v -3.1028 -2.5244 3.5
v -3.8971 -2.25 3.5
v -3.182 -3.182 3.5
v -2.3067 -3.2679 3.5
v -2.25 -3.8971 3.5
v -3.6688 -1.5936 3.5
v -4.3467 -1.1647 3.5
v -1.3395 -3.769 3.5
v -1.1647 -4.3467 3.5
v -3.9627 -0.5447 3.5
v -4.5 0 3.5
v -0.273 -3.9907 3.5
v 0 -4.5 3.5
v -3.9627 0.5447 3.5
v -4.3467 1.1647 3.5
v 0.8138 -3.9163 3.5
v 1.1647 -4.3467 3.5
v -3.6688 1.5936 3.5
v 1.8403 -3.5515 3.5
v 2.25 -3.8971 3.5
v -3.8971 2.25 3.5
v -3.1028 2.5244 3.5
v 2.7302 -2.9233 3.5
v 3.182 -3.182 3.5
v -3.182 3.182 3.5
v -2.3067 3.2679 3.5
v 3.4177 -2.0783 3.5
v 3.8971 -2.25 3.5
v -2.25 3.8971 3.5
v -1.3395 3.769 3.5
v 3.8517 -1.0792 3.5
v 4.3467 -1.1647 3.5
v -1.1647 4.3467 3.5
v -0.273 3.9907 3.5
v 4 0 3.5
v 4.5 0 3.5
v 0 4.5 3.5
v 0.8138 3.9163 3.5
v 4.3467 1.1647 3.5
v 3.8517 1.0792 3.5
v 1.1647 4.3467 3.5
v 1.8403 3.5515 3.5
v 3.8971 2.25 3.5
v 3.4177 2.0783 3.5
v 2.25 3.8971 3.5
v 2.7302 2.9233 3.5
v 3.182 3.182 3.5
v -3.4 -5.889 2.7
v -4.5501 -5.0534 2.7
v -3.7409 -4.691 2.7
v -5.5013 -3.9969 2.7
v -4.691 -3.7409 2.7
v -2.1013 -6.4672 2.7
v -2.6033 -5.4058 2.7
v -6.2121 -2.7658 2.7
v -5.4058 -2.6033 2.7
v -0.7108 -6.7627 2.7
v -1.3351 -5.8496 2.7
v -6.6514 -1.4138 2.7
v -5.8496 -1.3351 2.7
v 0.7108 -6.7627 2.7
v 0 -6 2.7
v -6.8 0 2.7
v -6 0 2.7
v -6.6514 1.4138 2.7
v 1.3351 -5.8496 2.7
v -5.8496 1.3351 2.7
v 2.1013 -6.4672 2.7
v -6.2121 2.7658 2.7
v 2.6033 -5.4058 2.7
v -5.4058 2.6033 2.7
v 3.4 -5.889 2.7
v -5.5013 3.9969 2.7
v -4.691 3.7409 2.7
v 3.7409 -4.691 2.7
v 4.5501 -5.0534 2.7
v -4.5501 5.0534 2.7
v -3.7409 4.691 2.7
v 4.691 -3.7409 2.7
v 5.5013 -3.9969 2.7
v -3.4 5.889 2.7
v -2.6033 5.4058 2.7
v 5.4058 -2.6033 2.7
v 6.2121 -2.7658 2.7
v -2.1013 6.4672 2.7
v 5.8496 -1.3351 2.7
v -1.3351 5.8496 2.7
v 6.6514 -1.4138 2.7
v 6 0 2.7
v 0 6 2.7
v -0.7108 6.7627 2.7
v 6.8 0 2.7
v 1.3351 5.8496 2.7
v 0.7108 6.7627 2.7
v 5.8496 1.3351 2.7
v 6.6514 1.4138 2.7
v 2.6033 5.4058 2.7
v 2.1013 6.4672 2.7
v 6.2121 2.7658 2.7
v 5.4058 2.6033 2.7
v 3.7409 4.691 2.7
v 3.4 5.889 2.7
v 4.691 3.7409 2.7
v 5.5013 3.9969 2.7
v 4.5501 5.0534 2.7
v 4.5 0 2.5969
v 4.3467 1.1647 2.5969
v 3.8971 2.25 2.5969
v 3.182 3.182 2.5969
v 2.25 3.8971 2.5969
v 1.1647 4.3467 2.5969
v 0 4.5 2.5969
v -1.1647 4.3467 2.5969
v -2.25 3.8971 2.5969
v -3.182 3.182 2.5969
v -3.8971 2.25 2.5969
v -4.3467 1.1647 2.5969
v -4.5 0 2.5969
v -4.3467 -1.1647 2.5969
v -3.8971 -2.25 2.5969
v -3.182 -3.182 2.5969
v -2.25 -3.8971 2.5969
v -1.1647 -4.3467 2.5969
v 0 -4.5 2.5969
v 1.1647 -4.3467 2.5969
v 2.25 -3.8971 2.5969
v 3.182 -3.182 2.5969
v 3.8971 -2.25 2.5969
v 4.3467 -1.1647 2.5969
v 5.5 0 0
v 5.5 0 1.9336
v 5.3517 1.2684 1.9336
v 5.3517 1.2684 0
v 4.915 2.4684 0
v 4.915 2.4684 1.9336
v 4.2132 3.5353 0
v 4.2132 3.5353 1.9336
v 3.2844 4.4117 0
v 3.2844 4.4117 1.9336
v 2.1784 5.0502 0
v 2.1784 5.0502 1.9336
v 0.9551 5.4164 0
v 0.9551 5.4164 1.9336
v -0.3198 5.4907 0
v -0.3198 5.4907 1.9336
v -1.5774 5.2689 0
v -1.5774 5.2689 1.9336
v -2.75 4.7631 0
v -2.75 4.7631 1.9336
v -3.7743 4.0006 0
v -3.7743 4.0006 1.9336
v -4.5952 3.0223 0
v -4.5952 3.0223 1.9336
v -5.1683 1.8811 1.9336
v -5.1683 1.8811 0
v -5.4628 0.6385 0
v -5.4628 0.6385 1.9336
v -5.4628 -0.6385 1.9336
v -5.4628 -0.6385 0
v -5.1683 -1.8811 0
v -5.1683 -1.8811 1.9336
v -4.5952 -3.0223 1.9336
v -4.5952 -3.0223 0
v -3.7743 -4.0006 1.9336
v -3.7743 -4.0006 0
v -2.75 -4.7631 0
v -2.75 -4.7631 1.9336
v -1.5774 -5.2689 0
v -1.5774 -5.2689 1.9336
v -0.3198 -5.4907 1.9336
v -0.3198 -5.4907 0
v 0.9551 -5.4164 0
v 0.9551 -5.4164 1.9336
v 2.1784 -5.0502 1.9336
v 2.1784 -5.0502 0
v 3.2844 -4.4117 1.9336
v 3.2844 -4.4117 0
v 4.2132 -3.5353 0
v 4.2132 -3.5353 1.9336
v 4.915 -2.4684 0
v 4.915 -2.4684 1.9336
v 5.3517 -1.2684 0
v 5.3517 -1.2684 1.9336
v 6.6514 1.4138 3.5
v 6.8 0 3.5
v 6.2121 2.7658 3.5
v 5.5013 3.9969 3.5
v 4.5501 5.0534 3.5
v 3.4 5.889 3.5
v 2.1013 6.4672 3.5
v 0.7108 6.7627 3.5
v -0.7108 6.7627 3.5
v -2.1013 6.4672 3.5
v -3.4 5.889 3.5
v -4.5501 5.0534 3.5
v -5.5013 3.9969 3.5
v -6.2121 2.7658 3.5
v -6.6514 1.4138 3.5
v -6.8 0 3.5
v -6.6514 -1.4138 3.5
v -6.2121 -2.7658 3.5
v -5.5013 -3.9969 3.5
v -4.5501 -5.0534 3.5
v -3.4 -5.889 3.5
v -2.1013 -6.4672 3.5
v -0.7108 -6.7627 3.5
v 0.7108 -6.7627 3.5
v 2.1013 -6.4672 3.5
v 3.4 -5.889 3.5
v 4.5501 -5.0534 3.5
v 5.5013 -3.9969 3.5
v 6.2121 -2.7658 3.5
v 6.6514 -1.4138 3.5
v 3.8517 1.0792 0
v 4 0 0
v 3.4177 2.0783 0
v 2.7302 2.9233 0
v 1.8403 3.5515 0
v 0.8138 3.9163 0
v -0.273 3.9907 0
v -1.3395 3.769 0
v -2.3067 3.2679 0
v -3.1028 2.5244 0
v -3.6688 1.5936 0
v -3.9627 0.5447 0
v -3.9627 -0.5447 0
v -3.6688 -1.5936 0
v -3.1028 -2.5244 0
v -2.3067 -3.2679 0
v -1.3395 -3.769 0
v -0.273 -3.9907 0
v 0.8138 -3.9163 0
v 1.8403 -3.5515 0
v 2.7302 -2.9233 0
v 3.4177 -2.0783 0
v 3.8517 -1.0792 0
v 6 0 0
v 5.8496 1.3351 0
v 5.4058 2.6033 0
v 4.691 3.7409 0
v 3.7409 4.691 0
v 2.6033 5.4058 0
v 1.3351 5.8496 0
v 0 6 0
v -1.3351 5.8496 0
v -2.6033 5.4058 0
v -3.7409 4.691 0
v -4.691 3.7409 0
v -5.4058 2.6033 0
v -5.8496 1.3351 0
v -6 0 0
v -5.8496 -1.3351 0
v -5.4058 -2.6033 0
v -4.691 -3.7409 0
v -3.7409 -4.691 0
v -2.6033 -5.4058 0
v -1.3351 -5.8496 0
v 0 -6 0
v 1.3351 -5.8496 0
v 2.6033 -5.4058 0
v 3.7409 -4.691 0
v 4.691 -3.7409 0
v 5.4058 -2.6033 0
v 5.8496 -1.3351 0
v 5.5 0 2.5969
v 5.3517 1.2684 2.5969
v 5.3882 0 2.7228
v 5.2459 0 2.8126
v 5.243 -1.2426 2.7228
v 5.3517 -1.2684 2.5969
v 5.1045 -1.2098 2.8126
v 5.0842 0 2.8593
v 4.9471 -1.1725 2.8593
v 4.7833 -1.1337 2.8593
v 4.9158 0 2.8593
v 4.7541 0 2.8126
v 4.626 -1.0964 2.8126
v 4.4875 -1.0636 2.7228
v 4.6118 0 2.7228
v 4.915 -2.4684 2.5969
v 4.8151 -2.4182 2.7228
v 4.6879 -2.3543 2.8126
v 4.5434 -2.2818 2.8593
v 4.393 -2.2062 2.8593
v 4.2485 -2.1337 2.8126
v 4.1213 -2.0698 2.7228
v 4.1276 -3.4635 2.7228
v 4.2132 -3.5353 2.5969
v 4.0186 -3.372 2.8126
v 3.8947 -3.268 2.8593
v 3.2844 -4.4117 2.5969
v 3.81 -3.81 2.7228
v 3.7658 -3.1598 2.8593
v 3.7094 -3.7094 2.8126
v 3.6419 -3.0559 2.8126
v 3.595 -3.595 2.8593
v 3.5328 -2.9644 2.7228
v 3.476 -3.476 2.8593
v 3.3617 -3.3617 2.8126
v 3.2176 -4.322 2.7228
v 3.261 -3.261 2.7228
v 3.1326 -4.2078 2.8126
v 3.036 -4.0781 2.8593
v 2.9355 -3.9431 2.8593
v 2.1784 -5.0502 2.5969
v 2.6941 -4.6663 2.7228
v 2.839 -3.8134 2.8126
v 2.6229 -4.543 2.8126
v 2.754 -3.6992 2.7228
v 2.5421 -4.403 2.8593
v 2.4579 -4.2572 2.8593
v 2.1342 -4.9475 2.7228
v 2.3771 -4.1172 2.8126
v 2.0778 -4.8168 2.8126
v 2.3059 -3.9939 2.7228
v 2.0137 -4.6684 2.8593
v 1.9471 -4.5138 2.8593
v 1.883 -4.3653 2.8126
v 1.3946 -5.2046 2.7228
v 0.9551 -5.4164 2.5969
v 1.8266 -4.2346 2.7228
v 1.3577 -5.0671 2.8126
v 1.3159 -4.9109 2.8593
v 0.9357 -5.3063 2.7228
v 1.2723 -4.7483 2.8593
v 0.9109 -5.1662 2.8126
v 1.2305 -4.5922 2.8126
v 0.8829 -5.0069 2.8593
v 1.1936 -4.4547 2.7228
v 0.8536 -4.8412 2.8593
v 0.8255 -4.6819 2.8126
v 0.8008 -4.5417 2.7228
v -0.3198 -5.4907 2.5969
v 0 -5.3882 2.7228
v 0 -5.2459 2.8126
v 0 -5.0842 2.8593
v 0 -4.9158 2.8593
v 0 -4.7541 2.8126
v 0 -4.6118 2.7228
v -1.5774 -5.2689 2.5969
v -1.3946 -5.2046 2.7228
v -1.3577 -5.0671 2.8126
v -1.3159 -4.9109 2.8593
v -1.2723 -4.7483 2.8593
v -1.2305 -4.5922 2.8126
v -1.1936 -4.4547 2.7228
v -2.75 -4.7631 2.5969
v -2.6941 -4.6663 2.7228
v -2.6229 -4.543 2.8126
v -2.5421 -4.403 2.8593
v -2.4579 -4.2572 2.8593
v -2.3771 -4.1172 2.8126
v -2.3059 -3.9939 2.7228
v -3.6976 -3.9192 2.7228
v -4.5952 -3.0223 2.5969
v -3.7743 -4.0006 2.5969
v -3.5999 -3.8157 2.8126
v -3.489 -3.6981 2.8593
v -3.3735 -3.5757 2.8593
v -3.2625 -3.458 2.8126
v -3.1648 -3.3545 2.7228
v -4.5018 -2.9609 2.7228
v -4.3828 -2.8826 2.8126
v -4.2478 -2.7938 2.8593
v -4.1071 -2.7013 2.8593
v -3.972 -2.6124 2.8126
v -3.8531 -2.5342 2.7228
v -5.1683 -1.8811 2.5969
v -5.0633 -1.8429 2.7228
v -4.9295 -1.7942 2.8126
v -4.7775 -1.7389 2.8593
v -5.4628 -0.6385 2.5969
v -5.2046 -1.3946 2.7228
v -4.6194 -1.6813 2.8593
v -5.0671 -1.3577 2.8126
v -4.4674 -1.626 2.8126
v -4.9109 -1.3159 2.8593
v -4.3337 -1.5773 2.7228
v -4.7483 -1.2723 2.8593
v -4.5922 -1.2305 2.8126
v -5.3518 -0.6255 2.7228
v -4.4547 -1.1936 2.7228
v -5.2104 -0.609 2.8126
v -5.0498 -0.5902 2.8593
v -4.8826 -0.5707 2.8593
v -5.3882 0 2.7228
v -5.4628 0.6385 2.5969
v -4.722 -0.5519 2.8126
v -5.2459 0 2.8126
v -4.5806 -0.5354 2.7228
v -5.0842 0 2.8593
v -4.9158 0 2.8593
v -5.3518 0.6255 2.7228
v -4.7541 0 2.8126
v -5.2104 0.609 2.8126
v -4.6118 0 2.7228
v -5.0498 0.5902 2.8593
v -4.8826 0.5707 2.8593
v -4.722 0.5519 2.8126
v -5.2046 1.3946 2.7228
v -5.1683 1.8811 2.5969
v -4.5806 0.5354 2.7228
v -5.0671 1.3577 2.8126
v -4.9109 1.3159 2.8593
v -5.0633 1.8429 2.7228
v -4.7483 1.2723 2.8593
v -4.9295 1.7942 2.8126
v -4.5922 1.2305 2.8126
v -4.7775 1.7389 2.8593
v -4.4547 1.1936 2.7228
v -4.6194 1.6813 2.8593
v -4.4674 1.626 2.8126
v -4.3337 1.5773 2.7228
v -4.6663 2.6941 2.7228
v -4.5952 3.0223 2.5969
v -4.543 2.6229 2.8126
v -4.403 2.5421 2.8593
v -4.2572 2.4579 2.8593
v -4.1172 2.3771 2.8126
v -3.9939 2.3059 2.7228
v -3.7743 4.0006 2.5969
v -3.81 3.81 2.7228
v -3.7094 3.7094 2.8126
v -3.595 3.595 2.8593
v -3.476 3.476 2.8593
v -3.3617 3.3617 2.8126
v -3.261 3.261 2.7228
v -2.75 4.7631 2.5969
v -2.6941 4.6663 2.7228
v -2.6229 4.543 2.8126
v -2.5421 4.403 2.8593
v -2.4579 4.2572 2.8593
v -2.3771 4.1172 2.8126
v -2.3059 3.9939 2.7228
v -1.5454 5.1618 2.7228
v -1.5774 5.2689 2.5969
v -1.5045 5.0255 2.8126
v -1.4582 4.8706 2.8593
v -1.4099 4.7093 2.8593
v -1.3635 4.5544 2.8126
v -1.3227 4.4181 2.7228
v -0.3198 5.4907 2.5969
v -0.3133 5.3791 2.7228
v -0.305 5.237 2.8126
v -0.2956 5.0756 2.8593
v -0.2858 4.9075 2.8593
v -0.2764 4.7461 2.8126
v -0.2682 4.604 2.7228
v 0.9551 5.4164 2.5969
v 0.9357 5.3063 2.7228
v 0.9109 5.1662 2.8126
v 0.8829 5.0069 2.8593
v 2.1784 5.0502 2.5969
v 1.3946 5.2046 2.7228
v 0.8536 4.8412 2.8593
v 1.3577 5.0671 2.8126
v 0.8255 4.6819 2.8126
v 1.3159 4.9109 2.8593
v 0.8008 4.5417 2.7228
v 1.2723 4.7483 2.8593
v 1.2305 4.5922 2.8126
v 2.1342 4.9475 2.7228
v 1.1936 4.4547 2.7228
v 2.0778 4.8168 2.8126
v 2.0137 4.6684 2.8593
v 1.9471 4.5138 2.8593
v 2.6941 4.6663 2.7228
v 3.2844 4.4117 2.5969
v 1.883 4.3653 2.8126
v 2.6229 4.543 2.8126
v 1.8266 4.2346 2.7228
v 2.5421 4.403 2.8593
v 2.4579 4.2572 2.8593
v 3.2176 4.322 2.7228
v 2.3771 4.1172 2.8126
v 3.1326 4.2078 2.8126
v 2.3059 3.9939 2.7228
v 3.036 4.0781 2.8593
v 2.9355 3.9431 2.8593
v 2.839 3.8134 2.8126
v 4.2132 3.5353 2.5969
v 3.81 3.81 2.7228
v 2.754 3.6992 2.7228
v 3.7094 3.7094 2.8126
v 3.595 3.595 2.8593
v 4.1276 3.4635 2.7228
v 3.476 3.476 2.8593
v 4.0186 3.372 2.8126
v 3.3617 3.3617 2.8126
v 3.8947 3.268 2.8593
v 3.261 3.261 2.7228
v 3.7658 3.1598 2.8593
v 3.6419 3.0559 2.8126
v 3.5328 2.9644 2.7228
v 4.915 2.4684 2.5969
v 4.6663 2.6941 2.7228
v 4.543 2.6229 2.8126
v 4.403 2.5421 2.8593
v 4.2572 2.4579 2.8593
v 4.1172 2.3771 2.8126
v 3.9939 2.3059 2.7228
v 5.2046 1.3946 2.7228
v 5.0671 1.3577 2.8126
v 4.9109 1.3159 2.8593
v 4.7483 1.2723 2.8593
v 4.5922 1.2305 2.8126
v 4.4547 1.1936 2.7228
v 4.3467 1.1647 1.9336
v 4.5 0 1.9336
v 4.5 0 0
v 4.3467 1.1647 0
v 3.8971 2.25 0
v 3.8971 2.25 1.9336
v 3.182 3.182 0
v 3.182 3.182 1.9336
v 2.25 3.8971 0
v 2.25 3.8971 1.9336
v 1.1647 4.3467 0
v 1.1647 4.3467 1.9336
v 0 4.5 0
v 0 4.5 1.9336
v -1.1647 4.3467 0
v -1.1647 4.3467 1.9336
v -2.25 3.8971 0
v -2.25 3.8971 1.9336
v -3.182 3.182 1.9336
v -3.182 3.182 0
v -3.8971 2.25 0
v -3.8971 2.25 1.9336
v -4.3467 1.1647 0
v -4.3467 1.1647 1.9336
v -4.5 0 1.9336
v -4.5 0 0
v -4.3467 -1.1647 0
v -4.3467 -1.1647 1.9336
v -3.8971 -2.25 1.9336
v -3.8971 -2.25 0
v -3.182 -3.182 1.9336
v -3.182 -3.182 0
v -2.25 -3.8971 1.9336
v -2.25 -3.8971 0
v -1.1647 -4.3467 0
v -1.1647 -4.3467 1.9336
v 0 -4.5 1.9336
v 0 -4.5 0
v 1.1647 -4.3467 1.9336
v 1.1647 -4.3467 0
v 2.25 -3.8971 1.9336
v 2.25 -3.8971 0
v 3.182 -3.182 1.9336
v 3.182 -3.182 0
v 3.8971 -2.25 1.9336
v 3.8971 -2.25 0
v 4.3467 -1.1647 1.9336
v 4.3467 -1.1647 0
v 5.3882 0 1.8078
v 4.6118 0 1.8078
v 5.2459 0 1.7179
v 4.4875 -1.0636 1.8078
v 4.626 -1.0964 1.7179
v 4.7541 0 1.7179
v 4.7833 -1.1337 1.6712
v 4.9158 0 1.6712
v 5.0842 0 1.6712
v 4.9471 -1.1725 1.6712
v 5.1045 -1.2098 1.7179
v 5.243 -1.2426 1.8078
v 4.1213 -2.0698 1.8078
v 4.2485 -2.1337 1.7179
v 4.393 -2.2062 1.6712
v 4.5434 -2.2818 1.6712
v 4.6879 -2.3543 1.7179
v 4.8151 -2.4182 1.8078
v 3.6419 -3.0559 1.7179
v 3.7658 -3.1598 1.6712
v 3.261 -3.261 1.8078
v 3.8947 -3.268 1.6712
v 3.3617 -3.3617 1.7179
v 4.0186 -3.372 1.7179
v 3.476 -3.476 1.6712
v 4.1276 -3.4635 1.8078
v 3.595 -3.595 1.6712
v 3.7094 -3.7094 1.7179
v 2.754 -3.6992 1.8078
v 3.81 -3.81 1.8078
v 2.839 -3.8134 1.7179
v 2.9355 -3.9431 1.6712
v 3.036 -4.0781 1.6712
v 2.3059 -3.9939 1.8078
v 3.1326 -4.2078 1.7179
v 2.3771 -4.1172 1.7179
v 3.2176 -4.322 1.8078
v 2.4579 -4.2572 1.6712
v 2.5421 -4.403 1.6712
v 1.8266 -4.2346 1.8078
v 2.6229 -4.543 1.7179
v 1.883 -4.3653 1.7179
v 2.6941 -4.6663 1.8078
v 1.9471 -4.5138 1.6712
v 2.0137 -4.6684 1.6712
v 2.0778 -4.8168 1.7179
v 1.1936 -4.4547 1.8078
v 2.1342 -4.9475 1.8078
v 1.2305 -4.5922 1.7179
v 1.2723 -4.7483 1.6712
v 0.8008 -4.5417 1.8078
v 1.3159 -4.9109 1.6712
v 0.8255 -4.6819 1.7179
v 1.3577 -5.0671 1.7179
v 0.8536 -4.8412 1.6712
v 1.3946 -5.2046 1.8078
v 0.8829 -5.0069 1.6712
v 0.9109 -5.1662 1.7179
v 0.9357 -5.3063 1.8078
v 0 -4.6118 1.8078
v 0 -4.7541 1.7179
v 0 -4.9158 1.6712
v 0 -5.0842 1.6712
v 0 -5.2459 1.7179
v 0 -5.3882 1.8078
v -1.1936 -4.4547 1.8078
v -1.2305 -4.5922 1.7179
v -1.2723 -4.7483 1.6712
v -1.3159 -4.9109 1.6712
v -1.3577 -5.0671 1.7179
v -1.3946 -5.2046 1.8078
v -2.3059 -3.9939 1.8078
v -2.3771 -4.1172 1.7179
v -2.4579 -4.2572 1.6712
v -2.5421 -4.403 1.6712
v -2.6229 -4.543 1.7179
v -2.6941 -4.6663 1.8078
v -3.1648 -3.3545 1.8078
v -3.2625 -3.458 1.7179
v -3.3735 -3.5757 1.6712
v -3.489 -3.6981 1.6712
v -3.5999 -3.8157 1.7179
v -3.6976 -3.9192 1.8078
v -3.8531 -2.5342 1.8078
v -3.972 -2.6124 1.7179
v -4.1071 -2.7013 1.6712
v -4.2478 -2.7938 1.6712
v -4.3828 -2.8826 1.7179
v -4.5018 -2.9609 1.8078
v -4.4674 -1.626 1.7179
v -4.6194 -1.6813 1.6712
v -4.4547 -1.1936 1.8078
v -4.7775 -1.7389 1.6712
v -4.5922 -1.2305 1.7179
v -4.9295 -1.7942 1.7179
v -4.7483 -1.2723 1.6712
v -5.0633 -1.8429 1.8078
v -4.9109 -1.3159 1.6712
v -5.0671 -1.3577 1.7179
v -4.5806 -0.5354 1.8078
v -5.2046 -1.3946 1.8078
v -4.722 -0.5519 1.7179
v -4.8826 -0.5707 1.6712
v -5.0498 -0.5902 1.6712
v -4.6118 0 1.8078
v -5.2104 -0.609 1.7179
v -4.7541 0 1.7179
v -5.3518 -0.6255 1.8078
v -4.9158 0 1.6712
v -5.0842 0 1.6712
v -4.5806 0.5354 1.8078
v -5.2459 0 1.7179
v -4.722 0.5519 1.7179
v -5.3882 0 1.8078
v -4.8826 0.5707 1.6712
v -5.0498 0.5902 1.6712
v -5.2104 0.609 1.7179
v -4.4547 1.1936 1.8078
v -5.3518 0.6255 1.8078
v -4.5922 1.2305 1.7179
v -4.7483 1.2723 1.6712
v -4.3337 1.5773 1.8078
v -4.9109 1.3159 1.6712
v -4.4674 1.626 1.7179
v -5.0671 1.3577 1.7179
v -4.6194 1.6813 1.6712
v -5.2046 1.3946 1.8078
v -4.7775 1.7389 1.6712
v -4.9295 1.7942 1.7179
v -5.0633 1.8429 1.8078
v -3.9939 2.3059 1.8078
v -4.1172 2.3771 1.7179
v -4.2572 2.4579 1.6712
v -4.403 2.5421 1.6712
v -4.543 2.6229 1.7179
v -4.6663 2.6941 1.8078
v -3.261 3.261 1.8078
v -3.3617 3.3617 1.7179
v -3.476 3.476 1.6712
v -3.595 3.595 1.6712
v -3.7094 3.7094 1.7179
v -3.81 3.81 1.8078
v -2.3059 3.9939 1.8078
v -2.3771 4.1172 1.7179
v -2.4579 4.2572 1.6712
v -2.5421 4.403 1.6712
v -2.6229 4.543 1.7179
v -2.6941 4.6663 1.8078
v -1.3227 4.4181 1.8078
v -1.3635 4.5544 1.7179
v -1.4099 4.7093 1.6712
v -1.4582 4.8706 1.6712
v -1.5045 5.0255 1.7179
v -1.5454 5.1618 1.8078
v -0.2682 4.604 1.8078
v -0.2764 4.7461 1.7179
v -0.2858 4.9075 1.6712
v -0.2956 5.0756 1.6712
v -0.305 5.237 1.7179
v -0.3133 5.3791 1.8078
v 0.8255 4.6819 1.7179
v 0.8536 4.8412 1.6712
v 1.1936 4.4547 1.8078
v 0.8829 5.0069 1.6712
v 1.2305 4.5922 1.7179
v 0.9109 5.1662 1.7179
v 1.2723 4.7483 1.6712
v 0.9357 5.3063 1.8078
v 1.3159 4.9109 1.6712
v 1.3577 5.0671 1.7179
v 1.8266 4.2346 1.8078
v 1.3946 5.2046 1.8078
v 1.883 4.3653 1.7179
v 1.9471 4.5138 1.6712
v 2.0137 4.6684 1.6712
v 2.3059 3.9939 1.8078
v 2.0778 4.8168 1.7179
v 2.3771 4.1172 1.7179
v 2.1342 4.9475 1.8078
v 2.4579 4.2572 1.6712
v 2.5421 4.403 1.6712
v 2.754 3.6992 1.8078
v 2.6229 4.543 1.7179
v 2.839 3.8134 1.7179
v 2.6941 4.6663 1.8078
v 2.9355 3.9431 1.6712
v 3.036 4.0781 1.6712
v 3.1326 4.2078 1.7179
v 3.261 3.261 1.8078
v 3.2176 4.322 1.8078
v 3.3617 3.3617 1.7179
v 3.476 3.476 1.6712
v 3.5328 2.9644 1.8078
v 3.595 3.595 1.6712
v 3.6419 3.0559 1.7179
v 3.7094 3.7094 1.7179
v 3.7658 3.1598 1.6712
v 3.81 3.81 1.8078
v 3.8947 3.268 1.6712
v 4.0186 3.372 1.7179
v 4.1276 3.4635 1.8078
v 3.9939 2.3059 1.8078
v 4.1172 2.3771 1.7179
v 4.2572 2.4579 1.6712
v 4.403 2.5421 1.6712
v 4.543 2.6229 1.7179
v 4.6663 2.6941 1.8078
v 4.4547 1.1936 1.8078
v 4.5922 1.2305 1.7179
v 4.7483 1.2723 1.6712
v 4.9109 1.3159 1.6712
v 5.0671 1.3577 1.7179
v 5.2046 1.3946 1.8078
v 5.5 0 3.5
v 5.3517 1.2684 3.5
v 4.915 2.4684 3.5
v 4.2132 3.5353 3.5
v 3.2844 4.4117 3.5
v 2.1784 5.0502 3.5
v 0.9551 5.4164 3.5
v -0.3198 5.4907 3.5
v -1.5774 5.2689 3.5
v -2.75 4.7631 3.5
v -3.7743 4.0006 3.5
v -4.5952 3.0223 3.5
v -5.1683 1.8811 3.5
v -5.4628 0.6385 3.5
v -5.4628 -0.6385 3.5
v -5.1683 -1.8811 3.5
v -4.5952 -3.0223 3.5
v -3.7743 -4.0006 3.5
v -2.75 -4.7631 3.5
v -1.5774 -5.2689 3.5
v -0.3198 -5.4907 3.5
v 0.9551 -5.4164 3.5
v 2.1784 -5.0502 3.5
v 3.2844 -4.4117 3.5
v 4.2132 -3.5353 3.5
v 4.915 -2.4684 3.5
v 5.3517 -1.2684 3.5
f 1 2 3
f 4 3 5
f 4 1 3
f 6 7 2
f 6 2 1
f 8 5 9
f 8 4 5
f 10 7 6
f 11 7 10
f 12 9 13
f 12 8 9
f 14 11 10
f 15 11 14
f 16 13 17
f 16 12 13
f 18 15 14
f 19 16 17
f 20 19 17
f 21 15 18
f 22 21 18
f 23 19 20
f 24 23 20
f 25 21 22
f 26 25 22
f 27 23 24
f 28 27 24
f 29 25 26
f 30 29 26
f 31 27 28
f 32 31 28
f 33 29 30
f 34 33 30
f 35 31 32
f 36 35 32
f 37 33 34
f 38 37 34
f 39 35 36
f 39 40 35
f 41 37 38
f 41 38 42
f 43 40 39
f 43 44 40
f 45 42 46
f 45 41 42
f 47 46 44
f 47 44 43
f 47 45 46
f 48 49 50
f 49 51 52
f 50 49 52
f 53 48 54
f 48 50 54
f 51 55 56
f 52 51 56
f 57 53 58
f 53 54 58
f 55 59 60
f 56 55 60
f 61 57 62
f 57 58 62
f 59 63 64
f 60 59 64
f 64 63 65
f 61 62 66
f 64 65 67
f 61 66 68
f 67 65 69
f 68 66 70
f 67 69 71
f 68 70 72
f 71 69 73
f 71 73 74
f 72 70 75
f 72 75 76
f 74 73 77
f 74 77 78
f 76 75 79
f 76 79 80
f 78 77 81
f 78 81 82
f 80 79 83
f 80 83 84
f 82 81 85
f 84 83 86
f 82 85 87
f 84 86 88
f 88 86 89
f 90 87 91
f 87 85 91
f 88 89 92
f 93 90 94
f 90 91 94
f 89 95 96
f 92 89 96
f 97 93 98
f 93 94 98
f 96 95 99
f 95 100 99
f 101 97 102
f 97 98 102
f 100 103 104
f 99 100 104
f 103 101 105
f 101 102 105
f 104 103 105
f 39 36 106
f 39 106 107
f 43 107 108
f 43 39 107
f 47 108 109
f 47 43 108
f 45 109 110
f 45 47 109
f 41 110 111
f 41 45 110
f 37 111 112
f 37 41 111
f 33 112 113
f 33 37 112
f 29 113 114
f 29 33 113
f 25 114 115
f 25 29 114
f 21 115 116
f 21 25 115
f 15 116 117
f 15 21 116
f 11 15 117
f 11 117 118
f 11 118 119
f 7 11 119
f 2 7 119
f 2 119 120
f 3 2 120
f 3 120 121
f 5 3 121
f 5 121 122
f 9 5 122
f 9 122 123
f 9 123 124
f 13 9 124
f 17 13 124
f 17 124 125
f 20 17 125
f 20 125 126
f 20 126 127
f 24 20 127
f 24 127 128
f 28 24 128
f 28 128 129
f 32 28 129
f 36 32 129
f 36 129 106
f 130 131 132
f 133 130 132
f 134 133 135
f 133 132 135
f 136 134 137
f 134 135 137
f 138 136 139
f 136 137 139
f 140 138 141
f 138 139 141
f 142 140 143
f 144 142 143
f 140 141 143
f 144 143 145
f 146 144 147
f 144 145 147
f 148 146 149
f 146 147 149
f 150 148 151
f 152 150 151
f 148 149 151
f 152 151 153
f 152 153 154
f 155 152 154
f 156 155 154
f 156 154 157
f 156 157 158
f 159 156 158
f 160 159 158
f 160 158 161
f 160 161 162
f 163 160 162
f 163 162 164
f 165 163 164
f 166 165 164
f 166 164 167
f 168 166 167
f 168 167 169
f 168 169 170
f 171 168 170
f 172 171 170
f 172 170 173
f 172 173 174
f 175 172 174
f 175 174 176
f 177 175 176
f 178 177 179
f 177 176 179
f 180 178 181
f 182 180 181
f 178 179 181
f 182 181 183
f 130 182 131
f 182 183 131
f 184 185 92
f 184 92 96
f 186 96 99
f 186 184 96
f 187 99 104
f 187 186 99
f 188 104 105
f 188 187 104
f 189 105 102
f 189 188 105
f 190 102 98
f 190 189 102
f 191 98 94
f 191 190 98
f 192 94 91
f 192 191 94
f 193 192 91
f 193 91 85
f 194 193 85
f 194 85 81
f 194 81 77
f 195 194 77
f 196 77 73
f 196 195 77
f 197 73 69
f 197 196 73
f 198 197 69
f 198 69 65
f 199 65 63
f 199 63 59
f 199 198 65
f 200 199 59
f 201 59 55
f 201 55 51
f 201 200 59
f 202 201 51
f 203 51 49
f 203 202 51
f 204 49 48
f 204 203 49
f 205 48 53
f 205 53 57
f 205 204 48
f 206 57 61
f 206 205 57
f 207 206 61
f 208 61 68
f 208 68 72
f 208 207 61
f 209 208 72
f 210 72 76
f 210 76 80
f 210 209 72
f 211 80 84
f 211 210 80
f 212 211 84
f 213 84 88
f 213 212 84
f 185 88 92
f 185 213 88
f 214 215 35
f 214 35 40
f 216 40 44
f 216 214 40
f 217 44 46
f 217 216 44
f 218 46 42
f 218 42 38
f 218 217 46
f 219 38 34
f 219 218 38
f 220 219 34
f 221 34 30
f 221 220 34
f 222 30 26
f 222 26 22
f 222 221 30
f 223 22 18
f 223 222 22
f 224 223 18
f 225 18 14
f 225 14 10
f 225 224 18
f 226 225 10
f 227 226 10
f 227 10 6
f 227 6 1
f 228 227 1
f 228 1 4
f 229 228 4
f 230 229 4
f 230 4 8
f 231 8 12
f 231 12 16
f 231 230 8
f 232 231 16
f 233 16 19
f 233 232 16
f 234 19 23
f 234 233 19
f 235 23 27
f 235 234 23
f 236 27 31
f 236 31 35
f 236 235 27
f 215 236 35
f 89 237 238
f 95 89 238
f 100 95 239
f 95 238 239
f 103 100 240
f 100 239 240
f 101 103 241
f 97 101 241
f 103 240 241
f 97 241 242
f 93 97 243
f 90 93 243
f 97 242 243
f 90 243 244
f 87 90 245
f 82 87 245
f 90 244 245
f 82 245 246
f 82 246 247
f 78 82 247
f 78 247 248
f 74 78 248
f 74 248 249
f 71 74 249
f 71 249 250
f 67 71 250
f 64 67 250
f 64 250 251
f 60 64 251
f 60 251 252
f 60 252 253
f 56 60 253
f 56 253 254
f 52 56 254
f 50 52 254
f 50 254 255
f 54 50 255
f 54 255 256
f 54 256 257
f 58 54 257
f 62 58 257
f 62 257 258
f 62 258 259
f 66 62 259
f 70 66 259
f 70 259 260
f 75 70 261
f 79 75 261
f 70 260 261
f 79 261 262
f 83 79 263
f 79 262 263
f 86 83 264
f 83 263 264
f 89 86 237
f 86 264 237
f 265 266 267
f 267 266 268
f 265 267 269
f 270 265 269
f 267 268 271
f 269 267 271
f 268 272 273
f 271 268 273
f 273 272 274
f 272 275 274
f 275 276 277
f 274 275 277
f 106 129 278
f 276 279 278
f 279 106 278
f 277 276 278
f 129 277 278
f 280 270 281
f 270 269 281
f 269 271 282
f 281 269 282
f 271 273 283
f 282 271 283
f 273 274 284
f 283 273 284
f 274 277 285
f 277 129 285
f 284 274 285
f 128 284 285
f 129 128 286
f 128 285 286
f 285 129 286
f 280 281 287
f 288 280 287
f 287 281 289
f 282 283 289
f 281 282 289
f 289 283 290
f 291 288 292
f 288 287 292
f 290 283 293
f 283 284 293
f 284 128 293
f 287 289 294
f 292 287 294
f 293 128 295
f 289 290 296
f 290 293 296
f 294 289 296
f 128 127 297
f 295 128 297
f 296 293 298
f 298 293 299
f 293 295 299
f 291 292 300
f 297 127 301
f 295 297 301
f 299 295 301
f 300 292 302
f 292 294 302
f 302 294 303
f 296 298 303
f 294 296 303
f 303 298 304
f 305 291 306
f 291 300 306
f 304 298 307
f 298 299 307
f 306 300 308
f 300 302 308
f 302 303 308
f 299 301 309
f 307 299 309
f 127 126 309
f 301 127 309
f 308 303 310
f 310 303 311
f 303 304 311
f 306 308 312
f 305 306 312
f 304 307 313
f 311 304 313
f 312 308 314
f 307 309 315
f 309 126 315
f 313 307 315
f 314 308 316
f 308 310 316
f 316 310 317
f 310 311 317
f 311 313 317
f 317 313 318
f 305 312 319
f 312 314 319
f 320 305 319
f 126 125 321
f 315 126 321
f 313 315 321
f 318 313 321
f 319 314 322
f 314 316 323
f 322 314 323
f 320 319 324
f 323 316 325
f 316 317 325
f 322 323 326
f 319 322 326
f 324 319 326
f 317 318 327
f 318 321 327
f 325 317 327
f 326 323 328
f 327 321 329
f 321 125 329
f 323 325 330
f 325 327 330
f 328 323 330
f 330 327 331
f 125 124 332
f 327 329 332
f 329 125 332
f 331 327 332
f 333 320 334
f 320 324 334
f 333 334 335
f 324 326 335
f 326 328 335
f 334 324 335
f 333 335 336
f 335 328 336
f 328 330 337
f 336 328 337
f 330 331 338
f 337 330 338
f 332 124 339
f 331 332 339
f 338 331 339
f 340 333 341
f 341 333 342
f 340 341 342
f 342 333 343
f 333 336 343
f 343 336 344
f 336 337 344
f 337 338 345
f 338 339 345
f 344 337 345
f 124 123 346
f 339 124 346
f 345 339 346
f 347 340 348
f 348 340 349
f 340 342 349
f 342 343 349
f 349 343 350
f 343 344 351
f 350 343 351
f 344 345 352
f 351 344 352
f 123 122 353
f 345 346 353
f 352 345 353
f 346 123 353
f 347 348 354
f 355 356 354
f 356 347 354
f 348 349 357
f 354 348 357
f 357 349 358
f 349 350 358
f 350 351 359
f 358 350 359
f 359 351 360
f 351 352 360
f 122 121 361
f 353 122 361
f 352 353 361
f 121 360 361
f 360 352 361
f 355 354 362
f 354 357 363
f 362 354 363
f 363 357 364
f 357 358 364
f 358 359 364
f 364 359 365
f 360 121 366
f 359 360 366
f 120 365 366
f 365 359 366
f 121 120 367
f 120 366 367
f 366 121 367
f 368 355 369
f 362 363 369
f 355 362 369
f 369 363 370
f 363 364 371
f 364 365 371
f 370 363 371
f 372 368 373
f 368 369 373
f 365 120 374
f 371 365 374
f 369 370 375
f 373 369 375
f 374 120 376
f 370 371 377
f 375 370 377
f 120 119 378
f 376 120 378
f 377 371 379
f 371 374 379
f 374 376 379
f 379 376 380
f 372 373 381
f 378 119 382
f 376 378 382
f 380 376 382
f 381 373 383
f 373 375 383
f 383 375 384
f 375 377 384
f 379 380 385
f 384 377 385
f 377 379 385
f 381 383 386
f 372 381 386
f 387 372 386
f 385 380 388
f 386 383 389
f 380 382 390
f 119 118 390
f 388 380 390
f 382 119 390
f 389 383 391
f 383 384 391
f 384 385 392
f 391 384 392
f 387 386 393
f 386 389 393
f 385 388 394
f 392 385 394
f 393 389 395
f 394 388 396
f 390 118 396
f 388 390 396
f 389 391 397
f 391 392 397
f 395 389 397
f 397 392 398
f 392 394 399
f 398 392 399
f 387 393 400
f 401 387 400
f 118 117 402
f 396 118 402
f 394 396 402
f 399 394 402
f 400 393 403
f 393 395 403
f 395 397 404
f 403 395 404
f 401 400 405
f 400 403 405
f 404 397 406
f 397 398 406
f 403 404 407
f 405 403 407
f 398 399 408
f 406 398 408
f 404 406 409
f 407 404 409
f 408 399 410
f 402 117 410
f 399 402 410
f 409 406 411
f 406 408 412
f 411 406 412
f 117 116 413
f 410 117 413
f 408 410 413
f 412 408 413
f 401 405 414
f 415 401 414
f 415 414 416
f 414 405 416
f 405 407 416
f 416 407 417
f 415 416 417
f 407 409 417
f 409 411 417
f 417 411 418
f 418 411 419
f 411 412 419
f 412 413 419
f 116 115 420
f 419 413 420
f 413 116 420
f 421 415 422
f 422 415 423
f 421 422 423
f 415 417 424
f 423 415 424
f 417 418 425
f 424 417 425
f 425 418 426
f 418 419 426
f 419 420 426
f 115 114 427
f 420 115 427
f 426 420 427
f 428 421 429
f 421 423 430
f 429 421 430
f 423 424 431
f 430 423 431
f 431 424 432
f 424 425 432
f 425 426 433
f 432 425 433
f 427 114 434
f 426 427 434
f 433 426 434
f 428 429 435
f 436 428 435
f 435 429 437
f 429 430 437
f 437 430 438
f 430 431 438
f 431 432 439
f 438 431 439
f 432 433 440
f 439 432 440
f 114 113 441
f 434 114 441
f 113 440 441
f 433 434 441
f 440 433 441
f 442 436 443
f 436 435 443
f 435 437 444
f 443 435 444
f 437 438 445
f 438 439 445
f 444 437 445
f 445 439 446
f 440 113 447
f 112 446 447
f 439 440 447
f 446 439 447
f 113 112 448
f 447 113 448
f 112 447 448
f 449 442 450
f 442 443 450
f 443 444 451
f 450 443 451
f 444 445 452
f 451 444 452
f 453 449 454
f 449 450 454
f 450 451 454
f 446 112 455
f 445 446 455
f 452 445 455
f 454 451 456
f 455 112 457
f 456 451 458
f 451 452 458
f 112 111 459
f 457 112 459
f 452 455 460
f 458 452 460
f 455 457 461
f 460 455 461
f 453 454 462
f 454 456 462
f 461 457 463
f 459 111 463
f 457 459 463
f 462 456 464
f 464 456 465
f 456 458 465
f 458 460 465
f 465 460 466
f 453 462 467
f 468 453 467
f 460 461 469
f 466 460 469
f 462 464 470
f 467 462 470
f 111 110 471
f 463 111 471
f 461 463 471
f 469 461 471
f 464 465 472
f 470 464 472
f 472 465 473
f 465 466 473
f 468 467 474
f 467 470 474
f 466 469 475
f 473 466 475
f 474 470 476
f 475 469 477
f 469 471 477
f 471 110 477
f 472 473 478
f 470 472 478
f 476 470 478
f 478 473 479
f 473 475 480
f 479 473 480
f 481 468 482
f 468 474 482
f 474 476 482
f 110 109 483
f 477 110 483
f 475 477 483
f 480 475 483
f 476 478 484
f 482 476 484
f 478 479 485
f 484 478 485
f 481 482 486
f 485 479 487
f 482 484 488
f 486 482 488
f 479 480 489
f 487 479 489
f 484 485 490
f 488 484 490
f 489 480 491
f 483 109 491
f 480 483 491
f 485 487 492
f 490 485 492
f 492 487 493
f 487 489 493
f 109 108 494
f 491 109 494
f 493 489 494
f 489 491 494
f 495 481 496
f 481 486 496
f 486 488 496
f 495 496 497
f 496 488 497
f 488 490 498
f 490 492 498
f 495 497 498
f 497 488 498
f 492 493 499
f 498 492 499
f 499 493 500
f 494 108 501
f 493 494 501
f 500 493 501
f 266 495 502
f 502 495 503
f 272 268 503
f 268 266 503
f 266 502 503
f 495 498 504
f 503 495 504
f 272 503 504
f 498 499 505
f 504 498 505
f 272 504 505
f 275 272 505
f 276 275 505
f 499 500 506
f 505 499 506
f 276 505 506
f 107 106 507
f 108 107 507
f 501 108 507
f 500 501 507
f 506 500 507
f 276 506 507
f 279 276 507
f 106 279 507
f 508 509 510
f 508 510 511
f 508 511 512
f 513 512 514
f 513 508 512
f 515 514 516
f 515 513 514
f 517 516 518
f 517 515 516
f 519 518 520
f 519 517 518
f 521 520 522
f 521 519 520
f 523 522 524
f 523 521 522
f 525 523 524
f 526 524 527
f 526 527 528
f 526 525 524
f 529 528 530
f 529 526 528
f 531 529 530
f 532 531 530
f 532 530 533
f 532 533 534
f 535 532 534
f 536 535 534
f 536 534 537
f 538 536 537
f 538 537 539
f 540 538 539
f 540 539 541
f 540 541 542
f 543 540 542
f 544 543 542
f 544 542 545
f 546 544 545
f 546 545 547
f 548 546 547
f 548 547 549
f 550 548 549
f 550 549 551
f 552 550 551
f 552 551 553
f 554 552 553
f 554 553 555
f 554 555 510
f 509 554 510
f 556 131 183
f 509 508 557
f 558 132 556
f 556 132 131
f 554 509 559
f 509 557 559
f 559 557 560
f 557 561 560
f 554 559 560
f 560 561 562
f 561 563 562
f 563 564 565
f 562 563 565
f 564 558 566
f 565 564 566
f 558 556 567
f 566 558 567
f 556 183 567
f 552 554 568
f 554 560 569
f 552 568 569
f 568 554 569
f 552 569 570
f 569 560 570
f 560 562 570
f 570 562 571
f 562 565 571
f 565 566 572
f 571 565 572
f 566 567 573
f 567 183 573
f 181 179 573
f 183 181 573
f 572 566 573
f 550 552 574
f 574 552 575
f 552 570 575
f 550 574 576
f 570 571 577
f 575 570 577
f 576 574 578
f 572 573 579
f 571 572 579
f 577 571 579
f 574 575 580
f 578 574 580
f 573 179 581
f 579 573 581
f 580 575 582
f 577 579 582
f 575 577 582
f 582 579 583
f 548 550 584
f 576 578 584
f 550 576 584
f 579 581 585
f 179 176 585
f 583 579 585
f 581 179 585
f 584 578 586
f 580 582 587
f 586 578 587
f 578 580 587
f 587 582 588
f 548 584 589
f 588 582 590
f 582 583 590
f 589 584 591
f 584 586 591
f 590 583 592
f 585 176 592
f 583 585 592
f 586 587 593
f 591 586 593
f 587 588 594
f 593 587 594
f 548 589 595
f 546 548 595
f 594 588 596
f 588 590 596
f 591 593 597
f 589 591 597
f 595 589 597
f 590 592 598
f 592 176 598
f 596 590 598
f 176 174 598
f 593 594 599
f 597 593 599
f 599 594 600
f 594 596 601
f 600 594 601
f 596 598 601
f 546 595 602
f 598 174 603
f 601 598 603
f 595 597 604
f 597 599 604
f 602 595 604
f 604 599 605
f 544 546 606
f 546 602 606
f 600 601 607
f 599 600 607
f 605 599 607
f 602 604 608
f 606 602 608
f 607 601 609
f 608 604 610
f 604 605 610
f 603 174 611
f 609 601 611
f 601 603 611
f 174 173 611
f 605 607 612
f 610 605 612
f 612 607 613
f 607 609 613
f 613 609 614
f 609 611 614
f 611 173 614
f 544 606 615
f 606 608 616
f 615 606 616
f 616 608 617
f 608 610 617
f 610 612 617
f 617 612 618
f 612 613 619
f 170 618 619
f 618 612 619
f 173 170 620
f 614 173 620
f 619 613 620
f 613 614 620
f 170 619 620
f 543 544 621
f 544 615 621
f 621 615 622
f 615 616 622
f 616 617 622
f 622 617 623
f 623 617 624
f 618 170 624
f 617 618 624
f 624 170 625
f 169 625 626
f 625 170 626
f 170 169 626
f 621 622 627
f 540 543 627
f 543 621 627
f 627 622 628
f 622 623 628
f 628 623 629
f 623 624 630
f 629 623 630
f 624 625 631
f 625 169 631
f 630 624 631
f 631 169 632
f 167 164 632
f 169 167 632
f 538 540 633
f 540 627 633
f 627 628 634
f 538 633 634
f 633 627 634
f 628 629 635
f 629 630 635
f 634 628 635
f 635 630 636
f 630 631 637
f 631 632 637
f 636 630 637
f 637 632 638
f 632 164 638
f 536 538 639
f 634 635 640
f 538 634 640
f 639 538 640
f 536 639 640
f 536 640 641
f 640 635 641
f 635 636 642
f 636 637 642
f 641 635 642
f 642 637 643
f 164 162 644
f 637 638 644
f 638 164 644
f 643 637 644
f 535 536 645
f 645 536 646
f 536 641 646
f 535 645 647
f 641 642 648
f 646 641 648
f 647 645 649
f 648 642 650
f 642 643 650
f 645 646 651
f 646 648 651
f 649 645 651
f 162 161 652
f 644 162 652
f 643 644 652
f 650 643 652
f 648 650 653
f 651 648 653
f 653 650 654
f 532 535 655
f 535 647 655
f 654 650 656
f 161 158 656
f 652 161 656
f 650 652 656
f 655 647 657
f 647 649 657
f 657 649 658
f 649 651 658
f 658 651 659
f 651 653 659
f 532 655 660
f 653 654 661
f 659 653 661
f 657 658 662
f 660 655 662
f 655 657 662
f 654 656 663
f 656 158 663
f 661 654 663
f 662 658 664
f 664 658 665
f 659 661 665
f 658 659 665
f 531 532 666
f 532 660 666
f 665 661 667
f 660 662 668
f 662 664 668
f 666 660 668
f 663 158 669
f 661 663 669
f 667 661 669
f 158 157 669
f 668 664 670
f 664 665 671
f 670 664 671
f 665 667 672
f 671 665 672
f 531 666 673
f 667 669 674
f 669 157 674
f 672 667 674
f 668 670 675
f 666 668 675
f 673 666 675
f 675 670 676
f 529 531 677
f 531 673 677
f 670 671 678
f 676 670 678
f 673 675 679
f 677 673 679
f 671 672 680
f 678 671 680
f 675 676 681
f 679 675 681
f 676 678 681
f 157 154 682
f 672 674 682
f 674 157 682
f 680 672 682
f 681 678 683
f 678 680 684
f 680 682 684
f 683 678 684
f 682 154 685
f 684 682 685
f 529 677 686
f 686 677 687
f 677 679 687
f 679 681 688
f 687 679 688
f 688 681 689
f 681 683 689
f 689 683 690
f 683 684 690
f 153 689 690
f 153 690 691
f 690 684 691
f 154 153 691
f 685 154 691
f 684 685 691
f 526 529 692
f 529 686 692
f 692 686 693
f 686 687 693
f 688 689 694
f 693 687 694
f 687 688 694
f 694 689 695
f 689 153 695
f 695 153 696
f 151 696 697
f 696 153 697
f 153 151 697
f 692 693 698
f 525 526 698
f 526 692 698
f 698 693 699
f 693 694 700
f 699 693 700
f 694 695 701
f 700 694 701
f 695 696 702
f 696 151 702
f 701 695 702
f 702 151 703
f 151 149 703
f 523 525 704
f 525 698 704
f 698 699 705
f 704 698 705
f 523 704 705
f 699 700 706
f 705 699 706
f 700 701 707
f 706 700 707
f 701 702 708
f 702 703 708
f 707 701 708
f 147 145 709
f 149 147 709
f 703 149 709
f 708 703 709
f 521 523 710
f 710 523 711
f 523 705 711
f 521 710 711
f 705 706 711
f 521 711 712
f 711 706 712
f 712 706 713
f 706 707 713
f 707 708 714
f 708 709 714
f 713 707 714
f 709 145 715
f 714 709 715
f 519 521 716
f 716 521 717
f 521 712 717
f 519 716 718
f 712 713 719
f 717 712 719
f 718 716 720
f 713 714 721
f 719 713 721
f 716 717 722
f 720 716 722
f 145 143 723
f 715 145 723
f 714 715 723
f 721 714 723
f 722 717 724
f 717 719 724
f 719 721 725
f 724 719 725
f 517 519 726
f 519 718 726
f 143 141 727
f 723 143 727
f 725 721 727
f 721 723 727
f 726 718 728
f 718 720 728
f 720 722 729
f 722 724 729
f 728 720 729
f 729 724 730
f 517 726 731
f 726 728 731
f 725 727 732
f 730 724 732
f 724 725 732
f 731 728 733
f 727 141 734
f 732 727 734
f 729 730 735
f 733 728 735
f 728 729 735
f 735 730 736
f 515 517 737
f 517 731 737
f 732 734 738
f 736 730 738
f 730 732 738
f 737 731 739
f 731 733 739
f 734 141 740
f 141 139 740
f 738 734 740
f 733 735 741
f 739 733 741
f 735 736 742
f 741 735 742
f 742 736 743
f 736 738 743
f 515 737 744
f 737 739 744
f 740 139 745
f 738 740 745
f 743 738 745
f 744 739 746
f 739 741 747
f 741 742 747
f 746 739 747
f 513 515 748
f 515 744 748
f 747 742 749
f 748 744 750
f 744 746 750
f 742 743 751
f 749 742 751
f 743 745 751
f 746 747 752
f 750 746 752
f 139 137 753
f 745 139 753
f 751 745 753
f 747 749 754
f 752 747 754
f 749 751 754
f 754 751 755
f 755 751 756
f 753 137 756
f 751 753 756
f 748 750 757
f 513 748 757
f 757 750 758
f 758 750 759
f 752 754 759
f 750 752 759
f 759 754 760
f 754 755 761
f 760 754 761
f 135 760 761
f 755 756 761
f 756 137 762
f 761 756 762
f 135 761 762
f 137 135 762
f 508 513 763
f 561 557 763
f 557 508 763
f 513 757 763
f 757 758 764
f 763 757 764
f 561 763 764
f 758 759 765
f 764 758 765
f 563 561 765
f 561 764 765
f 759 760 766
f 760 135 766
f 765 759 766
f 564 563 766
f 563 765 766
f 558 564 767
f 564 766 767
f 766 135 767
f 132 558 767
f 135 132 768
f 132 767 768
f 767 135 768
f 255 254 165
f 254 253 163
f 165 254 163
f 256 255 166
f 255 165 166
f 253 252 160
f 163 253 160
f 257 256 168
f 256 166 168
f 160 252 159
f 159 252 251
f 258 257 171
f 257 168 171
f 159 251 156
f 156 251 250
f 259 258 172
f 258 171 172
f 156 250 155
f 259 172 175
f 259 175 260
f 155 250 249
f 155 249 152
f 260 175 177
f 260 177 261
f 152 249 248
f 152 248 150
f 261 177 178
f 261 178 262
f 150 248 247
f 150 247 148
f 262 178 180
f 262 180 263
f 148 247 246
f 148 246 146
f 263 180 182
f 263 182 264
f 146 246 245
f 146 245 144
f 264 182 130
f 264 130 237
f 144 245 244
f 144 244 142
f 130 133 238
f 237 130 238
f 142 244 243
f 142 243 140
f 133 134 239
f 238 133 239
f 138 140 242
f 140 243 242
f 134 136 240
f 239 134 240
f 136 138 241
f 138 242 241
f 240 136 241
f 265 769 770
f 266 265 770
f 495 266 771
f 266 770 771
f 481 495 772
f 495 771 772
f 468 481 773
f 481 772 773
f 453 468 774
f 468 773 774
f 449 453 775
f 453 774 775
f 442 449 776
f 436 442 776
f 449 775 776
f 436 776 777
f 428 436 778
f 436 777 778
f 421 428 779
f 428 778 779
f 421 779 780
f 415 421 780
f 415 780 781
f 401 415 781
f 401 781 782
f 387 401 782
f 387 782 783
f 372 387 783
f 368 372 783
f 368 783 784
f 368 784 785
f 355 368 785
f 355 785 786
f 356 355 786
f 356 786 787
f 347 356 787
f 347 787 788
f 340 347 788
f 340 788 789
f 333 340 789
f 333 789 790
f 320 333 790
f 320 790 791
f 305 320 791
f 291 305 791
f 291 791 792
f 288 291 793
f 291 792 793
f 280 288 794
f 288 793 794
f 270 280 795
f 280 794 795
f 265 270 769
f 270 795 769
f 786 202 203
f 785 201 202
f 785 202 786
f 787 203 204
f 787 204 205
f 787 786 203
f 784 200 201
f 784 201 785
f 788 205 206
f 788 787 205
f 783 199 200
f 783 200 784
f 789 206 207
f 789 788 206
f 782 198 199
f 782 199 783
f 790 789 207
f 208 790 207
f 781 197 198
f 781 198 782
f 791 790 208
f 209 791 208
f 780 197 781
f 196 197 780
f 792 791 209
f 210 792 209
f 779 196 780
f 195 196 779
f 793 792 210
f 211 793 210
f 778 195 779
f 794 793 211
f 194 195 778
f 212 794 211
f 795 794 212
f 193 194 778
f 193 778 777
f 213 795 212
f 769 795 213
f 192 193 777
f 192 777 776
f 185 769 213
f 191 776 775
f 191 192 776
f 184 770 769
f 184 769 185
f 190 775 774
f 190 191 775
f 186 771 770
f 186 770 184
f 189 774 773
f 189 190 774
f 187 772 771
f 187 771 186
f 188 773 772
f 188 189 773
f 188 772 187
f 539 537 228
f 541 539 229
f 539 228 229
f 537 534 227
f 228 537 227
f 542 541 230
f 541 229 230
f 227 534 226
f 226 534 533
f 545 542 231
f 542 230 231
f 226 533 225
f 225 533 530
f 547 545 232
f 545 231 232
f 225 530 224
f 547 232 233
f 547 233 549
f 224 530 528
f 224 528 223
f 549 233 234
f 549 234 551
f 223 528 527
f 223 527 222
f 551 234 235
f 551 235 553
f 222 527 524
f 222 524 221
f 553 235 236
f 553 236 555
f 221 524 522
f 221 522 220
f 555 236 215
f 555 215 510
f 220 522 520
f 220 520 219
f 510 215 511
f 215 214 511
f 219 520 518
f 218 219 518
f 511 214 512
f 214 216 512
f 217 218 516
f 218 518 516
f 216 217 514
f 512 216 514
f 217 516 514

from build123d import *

# Parameters (mm, degrees)
SKETCH1_R           = 6
SKETCH1_R_2         = 4
BOSS_EXTRUDE1_DEPTH = 3.5
SKETCH4_R           = 5.5
SKETCH4_R_2         = 4.5
CUT_EXTRUDE1_DEPTH  = 41.1
SKETCH6_R           = 0.6
SKETCH8_R           = 6.8
SKETCH8_R_2         = 6
BOSS_EXTRUDE3_DEPTH = 0.8


with BuildPart() as part:
    # Sketch1 → Boss-Extrude1 (new body)
    with BuildSketch(Plane.XY):
        Circle(SKETCH1_R)
        Circle(SKETCH1_R_2, mode=Mode.SUBTRACT)
    extrude(amount=BOSS_EXTRUDE1_DEPTH)

    # Sketch4 → Cut-Extrude1 (cut)
    with BuildSketch(Plane.XY.offset(3.5)):
        Circle(SKETCH4_R)
        Circle(SKETCH4_R_2, mode=Mode.SUBTRACT)
    extrude(amount=-CUT_EXTRUDE1_DEPTH, mode=Mode.SUBTRACT)


with BuildPart() as cut_extrude1_piece_1:
    # of the separate pieces the step leaves, piece 1, a body of its own (cut_extrude1_pieces)
    add(part.part.solids().sort_by_distance((6, 0, 0))[0])



with BuildPart() as cut_extrude1_piece_2:
    # of the separate pieces the step leaves, piece 2, a body of its own (cut_extrude1_pieces)
    add(part.part.solids().sort_by_distance((4.5, 0, 0))[0])


with BuildPart() as cut_extrude1_piece_1_1:
    add(cut_extrude1_piece_1.part)

    add(cut_extrude1_piece_2.part)  # Revolve1 merges Cut-Extrude1 piece 2
    # Sketch6 → Revolve1 (revolve)
    with BuildSketch(Plane(origin=(0, 0, 0), x_dir=(1, 0, 0), z_dir=(0, 1, 0)), mode=Mode.PRIVATE) as revolve1_sk:
        with Locations((-5, -2.265265141)):
            Circle(SKETCH6_R)
    revolve(revolve1_sk.sketch.rotate(Axis((0, 0, 3.5), (0, 0, -1)), 180), axis=Axis((0, 0, 3.5), (0, 0, -1)))

    # Sketch8 → Boss-Extrude3 (add)
    with BuildSketch(Plane.XY.offset(3.5)):
        Circle(SKETCH8_R)
        Circle(SKETCH8_R_2, mode=Mode.SUBTRACT)
    extrude(amount=-BOSS_EXTRUDE3_DEPTH)


solid = cut_extrude1_piece_1_1.part
